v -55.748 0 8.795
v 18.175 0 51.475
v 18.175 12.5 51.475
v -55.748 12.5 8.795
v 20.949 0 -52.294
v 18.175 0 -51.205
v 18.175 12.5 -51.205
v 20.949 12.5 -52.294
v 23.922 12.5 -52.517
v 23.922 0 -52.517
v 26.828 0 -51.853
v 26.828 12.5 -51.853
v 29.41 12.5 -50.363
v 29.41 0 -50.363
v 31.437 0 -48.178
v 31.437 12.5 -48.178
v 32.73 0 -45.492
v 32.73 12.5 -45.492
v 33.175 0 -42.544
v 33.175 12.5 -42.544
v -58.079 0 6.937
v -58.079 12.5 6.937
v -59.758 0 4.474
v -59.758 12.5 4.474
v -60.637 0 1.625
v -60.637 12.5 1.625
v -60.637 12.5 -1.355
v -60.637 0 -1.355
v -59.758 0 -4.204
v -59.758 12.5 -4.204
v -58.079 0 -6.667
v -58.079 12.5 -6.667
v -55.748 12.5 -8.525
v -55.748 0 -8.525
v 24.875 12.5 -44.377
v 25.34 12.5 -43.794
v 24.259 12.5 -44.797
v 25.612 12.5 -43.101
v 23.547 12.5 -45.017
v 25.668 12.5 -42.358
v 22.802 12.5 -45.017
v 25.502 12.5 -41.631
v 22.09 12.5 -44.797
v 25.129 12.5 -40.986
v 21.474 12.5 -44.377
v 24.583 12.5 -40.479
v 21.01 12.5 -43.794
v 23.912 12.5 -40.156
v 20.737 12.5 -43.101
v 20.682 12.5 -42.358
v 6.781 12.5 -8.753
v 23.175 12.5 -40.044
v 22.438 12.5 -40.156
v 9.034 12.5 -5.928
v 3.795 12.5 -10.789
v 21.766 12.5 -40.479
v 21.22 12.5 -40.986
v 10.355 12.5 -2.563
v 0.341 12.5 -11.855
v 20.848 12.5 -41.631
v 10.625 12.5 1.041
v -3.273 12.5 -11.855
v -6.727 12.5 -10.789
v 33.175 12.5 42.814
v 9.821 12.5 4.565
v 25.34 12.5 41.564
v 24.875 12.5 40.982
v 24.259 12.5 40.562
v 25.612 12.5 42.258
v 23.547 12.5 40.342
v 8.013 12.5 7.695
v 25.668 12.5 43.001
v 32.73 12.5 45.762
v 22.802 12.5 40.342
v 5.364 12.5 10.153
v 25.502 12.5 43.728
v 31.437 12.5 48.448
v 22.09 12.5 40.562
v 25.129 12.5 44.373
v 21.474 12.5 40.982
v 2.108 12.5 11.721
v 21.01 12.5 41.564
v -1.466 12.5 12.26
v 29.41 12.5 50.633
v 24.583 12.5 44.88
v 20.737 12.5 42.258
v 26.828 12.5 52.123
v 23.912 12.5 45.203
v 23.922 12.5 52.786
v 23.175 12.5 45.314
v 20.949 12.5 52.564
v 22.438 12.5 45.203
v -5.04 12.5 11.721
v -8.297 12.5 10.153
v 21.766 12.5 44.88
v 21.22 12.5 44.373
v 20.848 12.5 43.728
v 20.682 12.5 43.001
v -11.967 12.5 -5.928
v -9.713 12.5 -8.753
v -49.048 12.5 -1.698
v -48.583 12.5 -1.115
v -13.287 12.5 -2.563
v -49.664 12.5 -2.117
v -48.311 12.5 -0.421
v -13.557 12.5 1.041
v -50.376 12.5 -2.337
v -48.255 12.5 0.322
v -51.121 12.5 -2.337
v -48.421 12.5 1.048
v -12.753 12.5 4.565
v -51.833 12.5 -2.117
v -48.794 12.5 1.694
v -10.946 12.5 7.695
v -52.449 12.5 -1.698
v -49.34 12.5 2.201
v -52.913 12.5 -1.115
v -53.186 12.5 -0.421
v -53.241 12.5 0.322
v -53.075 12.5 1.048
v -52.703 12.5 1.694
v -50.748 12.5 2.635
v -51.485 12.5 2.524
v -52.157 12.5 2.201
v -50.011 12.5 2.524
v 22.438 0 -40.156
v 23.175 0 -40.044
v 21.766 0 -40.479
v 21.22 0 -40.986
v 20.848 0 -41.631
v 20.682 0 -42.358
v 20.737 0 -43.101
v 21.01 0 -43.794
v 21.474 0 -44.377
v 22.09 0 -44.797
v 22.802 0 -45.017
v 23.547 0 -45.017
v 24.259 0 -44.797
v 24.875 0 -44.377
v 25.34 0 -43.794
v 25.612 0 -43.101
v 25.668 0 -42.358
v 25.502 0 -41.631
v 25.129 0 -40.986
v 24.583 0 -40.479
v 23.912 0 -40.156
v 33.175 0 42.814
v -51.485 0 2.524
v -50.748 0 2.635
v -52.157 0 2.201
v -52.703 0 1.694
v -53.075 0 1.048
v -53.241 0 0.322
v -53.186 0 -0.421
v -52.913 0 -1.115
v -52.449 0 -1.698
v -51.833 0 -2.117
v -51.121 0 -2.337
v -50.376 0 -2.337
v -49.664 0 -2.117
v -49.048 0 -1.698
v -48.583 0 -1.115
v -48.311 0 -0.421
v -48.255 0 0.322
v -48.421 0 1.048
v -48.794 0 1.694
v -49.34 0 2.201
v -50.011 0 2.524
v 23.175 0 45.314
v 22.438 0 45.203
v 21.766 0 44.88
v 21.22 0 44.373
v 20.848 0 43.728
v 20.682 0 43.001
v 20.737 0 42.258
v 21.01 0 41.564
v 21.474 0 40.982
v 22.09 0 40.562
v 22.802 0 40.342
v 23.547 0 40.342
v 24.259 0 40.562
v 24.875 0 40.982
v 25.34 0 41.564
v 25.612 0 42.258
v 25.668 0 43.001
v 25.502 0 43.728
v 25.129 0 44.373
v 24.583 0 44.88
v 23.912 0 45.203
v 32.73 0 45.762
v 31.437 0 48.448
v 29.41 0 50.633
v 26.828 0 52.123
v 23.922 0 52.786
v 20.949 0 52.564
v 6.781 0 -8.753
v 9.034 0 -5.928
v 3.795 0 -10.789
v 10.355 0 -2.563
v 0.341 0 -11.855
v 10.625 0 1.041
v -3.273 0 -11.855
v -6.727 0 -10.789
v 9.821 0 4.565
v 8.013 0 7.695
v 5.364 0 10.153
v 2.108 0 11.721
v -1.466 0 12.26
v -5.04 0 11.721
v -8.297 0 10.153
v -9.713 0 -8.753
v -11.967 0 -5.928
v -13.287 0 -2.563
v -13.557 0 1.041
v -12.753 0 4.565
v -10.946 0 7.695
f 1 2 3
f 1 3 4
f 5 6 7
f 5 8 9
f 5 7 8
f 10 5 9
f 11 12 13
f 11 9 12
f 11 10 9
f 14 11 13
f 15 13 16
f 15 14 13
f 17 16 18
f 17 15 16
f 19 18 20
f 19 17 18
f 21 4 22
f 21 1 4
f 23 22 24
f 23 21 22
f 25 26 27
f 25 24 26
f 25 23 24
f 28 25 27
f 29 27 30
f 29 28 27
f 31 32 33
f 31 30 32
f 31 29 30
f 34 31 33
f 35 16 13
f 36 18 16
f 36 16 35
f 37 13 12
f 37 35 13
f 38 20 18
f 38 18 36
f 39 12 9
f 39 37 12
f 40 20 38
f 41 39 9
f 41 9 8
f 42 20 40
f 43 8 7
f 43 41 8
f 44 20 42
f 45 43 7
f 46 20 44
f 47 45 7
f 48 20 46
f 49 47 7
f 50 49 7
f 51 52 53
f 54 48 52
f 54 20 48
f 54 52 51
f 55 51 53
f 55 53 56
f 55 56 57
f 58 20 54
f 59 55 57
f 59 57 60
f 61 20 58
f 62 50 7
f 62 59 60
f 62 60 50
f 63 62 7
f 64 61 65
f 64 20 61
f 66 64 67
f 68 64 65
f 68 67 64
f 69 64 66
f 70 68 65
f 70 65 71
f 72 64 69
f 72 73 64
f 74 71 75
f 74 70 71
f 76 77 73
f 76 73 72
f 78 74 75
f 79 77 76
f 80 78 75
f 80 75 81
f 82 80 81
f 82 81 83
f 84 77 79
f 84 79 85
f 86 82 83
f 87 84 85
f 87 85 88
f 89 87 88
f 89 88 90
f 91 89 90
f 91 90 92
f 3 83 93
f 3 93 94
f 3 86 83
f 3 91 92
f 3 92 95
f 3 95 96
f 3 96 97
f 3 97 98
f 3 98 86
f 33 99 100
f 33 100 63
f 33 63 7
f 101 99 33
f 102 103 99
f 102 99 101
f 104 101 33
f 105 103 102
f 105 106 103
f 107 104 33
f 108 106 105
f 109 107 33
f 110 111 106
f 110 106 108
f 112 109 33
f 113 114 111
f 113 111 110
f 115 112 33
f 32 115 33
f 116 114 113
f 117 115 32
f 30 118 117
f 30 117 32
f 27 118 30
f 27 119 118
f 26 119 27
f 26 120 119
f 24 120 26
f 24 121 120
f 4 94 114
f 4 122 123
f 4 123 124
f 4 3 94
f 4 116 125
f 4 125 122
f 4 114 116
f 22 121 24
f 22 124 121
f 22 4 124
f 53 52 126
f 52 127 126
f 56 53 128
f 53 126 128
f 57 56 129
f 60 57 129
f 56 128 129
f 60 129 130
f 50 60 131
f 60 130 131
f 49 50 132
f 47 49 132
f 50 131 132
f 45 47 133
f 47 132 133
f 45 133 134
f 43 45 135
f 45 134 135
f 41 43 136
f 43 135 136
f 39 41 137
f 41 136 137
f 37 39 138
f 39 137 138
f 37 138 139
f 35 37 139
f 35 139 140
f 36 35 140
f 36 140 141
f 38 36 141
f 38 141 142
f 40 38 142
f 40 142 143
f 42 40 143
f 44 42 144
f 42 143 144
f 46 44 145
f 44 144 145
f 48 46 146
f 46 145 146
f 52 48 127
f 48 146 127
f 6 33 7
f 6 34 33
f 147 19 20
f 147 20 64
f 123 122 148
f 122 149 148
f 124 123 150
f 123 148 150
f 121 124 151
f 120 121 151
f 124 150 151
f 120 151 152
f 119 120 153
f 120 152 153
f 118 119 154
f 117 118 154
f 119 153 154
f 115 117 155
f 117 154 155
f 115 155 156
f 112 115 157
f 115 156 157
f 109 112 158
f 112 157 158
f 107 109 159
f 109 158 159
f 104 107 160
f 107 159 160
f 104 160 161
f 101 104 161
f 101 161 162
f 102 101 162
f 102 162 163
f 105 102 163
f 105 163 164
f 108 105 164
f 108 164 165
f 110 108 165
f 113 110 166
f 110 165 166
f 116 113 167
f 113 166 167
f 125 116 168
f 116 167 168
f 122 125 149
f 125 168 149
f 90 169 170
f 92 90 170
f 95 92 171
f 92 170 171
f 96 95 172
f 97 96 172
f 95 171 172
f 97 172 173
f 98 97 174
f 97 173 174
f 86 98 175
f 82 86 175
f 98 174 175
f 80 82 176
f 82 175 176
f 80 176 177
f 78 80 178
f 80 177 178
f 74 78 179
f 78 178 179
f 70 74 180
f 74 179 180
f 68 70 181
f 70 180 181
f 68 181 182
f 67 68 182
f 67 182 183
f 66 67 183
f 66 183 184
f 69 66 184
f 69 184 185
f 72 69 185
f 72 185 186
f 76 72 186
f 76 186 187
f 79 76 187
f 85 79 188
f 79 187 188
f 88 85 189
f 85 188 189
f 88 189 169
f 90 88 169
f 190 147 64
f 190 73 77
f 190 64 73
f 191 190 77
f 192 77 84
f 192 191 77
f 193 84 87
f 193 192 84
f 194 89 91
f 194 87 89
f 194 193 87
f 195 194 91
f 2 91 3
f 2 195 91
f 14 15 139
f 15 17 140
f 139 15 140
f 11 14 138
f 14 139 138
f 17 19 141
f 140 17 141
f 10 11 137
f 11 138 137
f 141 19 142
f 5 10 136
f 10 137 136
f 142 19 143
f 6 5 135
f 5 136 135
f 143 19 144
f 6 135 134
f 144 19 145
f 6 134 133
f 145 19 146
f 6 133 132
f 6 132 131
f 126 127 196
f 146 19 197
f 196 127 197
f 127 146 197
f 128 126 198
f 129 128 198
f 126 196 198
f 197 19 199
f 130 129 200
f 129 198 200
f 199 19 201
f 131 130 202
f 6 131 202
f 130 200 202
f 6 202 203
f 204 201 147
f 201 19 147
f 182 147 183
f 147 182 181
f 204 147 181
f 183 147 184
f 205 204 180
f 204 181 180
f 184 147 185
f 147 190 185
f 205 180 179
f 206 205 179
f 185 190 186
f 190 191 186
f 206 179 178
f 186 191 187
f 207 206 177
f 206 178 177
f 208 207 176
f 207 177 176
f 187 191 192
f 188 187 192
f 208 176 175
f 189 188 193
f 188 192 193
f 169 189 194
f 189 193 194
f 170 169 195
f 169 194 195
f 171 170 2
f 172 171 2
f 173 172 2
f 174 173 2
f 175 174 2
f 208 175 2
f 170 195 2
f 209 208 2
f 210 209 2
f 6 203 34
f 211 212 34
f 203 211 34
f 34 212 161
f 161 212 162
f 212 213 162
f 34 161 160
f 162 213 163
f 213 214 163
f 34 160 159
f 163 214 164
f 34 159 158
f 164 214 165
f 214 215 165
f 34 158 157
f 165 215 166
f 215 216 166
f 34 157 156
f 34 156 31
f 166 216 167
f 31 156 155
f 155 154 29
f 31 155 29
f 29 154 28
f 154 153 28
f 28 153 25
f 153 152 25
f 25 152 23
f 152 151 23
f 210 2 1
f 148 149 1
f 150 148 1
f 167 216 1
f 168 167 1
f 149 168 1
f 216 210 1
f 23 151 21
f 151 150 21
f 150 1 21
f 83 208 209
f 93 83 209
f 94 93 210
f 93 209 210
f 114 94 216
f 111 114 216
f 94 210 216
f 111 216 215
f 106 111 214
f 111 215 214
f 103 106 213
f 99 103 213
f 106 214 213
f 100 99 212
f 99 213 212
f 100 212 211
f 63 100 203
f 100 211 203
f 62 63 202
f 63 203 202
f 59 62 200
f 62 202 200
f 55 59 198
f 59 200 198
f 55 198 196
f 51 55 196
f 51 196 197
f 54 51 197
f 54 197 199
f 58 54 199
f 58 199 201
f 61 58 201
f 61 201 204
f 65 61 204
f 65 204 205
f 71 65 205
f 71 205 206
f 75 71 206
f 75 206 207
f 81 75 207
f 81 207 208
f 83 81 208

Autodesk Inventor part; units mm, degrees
ref_plane "YZ Plane" through (0, 0, 0) normal (1, 0, 0) x (0, 1, 0)
ref_plane "XZ Plane" through (0, 0, 0) normal (0, 1, 0) x (-1, 0, 0)
sketch "Sketch1" plane through (0, 0, 0) normal (0, 1, 0) x (-1, 0, 0)
  circle A0 centre (1.4663, 0.135) radius 40 projected
  circle A1 centre (1.4663, 0.135) radius 60 projected
  line L0 (55.7483, -8.5253) -> (-18.1747, -51.2048)
  line L1 (-33.1747, -42.5445) -> (-33.1747, 42.8145)
  line L2 (-18.1747, 51.4747) -> (55.7483, 8.7952)
  arc A2 (55.7483, -8.5253) -> (55.7483, 8.7952) centre (50.7483, 0.135) ccw
  arc A3 (-33.1747, -42.5445) -> (-18.1747, -51.2048) centre (-23.1747, -42.5445) ccw
  arc A4 (-18.1747, 51.4747) -> (-33.1747, 42.8145) centre (-23.1747, 42.8145) ccw
  point P0 (70.7483, 0.135)
  point P1 (-33.1747, -59.865)
  point P2 (-33.1747, 60.135)
  dimension "d2" = 120
  dimension "d3" = 10
extrude "Extrusion1" add sketch "Sketch1" along normal blind 12.7 contours A0 L0 L1 L2 | A0 L2 A2 L0 | A0 L1 A4 L2 | L0 A3 L1 A0
sketch "Sketch4" plane through (0, 0, 0) normal (0, -1, 0) x (1, 0, 0)
  line L0 (-55.7483, -8.5253) -> (18.1747, -51.2048) projected
  arc A0 (18.1747, -51.2048) -> (33.1747, -42.5445) centre (23.1747, -42.5445) ccw projected
  line L1 (33.1747, -42.5445) -> (33.1747, 42.8145) projected
  arc A1 (33.1747, 42.8145) -> (18.1747, 51.4747) centre (23.1747, 42.8145) ccw projected
  line L2 (18.1747, 51.4747) -> (-55.7483, 8.7952) projected
  arc A2 (-55.7483, 8.7952) -> (-55.7483, -8.5253) centre (-50.7483, 0.135) ccw projected
  point P0 (0, 0)
ref_plane "Work Plane1" through (-50.7483, 0, 0.135) normal (1, 0, 0) x (0, 0, -1)
sketch "Sketch6" plane through (0, 12.7, 0) normal (0, 1, 0) x (1, 0, 0)
  line L0 (18.1747, 51.2048) -> (-55.7483, 8.5253) projected
  arc A0 (-55.7483, 8.5253) -> (-55.7483, -8.7952) centre (-50.7483, -0.135) ccw projected
  line L1 (-55.7483, -8.7952) -> (18.1747, -51.4747) projected
  arc A1 (18.1747, -51.4747) -> (33.1747, -42.8145) centre (23.1747, -42.8145) ccw projected
  line L2 (33.1747, -42.8145) -> (33.1747, 42.5445) projected
  arc A2 (33.1747, 42.5445) -> (18.1747, 51.2048) centre (23.1747, 42.5445) ccw projected
  line L3 (23.1747, 42.5445) -> (23.1747, -42.8145) construction
  circle A3 centre (-50.7483, -0.135) radius 1.5 construction
  line L4 (-50.7483, -0.135) -> (23.1747, -0.135) construction
  line L5 (23.1747, 42.5445) -> (-50.7483, -0.135) construction
  line L6 (23.1747, -42.8145) -> (-13.7868, 21.2048) construction
  line L7 (-50.7483, -0.135) -> (23.1747, -42.8145) construction
  line L8 (23.1747, 42.5445) -> (-13.7868, -21.4747) construction
  circle A4 centre (-1.4663, -0.135) radius 17.5
  point P0 (0, 0)
  dimension "d38" = 35
hole "Hole1" at (-1.4663, 12.7, 0.135) direction (0, -1, 0) diameter 24.25 end through all
hole "Hole2" at (-50.7483, 12.7, 0.135) at (23.1747, 12.7, 42.8145) at (23.1747, 12.7, -42.5445) direction (0, -1, 0) diameter 5 end through all
thread "Thread1" size "M6x1" class "6H" standard "ANSI Metric M Profile" full length
thread "Thread2" size "M6x1" class "6H" standard "ANSI Metric M Profile" full length
thread "Thread3" size "M6x1" class "6H" standard "ANSI Metric M Profile" full length
thicken "Thicken1" operation add thickness 0.2 both sides no extend neighbours yes toward (0, -1, 0) faces at (25.6399, 12.7, 0.6222)
thread "Thread4" size "M25x2" class "6H" standard "ISO Metric profile" full length
properties part number "Triangle_RK" material "white material"
